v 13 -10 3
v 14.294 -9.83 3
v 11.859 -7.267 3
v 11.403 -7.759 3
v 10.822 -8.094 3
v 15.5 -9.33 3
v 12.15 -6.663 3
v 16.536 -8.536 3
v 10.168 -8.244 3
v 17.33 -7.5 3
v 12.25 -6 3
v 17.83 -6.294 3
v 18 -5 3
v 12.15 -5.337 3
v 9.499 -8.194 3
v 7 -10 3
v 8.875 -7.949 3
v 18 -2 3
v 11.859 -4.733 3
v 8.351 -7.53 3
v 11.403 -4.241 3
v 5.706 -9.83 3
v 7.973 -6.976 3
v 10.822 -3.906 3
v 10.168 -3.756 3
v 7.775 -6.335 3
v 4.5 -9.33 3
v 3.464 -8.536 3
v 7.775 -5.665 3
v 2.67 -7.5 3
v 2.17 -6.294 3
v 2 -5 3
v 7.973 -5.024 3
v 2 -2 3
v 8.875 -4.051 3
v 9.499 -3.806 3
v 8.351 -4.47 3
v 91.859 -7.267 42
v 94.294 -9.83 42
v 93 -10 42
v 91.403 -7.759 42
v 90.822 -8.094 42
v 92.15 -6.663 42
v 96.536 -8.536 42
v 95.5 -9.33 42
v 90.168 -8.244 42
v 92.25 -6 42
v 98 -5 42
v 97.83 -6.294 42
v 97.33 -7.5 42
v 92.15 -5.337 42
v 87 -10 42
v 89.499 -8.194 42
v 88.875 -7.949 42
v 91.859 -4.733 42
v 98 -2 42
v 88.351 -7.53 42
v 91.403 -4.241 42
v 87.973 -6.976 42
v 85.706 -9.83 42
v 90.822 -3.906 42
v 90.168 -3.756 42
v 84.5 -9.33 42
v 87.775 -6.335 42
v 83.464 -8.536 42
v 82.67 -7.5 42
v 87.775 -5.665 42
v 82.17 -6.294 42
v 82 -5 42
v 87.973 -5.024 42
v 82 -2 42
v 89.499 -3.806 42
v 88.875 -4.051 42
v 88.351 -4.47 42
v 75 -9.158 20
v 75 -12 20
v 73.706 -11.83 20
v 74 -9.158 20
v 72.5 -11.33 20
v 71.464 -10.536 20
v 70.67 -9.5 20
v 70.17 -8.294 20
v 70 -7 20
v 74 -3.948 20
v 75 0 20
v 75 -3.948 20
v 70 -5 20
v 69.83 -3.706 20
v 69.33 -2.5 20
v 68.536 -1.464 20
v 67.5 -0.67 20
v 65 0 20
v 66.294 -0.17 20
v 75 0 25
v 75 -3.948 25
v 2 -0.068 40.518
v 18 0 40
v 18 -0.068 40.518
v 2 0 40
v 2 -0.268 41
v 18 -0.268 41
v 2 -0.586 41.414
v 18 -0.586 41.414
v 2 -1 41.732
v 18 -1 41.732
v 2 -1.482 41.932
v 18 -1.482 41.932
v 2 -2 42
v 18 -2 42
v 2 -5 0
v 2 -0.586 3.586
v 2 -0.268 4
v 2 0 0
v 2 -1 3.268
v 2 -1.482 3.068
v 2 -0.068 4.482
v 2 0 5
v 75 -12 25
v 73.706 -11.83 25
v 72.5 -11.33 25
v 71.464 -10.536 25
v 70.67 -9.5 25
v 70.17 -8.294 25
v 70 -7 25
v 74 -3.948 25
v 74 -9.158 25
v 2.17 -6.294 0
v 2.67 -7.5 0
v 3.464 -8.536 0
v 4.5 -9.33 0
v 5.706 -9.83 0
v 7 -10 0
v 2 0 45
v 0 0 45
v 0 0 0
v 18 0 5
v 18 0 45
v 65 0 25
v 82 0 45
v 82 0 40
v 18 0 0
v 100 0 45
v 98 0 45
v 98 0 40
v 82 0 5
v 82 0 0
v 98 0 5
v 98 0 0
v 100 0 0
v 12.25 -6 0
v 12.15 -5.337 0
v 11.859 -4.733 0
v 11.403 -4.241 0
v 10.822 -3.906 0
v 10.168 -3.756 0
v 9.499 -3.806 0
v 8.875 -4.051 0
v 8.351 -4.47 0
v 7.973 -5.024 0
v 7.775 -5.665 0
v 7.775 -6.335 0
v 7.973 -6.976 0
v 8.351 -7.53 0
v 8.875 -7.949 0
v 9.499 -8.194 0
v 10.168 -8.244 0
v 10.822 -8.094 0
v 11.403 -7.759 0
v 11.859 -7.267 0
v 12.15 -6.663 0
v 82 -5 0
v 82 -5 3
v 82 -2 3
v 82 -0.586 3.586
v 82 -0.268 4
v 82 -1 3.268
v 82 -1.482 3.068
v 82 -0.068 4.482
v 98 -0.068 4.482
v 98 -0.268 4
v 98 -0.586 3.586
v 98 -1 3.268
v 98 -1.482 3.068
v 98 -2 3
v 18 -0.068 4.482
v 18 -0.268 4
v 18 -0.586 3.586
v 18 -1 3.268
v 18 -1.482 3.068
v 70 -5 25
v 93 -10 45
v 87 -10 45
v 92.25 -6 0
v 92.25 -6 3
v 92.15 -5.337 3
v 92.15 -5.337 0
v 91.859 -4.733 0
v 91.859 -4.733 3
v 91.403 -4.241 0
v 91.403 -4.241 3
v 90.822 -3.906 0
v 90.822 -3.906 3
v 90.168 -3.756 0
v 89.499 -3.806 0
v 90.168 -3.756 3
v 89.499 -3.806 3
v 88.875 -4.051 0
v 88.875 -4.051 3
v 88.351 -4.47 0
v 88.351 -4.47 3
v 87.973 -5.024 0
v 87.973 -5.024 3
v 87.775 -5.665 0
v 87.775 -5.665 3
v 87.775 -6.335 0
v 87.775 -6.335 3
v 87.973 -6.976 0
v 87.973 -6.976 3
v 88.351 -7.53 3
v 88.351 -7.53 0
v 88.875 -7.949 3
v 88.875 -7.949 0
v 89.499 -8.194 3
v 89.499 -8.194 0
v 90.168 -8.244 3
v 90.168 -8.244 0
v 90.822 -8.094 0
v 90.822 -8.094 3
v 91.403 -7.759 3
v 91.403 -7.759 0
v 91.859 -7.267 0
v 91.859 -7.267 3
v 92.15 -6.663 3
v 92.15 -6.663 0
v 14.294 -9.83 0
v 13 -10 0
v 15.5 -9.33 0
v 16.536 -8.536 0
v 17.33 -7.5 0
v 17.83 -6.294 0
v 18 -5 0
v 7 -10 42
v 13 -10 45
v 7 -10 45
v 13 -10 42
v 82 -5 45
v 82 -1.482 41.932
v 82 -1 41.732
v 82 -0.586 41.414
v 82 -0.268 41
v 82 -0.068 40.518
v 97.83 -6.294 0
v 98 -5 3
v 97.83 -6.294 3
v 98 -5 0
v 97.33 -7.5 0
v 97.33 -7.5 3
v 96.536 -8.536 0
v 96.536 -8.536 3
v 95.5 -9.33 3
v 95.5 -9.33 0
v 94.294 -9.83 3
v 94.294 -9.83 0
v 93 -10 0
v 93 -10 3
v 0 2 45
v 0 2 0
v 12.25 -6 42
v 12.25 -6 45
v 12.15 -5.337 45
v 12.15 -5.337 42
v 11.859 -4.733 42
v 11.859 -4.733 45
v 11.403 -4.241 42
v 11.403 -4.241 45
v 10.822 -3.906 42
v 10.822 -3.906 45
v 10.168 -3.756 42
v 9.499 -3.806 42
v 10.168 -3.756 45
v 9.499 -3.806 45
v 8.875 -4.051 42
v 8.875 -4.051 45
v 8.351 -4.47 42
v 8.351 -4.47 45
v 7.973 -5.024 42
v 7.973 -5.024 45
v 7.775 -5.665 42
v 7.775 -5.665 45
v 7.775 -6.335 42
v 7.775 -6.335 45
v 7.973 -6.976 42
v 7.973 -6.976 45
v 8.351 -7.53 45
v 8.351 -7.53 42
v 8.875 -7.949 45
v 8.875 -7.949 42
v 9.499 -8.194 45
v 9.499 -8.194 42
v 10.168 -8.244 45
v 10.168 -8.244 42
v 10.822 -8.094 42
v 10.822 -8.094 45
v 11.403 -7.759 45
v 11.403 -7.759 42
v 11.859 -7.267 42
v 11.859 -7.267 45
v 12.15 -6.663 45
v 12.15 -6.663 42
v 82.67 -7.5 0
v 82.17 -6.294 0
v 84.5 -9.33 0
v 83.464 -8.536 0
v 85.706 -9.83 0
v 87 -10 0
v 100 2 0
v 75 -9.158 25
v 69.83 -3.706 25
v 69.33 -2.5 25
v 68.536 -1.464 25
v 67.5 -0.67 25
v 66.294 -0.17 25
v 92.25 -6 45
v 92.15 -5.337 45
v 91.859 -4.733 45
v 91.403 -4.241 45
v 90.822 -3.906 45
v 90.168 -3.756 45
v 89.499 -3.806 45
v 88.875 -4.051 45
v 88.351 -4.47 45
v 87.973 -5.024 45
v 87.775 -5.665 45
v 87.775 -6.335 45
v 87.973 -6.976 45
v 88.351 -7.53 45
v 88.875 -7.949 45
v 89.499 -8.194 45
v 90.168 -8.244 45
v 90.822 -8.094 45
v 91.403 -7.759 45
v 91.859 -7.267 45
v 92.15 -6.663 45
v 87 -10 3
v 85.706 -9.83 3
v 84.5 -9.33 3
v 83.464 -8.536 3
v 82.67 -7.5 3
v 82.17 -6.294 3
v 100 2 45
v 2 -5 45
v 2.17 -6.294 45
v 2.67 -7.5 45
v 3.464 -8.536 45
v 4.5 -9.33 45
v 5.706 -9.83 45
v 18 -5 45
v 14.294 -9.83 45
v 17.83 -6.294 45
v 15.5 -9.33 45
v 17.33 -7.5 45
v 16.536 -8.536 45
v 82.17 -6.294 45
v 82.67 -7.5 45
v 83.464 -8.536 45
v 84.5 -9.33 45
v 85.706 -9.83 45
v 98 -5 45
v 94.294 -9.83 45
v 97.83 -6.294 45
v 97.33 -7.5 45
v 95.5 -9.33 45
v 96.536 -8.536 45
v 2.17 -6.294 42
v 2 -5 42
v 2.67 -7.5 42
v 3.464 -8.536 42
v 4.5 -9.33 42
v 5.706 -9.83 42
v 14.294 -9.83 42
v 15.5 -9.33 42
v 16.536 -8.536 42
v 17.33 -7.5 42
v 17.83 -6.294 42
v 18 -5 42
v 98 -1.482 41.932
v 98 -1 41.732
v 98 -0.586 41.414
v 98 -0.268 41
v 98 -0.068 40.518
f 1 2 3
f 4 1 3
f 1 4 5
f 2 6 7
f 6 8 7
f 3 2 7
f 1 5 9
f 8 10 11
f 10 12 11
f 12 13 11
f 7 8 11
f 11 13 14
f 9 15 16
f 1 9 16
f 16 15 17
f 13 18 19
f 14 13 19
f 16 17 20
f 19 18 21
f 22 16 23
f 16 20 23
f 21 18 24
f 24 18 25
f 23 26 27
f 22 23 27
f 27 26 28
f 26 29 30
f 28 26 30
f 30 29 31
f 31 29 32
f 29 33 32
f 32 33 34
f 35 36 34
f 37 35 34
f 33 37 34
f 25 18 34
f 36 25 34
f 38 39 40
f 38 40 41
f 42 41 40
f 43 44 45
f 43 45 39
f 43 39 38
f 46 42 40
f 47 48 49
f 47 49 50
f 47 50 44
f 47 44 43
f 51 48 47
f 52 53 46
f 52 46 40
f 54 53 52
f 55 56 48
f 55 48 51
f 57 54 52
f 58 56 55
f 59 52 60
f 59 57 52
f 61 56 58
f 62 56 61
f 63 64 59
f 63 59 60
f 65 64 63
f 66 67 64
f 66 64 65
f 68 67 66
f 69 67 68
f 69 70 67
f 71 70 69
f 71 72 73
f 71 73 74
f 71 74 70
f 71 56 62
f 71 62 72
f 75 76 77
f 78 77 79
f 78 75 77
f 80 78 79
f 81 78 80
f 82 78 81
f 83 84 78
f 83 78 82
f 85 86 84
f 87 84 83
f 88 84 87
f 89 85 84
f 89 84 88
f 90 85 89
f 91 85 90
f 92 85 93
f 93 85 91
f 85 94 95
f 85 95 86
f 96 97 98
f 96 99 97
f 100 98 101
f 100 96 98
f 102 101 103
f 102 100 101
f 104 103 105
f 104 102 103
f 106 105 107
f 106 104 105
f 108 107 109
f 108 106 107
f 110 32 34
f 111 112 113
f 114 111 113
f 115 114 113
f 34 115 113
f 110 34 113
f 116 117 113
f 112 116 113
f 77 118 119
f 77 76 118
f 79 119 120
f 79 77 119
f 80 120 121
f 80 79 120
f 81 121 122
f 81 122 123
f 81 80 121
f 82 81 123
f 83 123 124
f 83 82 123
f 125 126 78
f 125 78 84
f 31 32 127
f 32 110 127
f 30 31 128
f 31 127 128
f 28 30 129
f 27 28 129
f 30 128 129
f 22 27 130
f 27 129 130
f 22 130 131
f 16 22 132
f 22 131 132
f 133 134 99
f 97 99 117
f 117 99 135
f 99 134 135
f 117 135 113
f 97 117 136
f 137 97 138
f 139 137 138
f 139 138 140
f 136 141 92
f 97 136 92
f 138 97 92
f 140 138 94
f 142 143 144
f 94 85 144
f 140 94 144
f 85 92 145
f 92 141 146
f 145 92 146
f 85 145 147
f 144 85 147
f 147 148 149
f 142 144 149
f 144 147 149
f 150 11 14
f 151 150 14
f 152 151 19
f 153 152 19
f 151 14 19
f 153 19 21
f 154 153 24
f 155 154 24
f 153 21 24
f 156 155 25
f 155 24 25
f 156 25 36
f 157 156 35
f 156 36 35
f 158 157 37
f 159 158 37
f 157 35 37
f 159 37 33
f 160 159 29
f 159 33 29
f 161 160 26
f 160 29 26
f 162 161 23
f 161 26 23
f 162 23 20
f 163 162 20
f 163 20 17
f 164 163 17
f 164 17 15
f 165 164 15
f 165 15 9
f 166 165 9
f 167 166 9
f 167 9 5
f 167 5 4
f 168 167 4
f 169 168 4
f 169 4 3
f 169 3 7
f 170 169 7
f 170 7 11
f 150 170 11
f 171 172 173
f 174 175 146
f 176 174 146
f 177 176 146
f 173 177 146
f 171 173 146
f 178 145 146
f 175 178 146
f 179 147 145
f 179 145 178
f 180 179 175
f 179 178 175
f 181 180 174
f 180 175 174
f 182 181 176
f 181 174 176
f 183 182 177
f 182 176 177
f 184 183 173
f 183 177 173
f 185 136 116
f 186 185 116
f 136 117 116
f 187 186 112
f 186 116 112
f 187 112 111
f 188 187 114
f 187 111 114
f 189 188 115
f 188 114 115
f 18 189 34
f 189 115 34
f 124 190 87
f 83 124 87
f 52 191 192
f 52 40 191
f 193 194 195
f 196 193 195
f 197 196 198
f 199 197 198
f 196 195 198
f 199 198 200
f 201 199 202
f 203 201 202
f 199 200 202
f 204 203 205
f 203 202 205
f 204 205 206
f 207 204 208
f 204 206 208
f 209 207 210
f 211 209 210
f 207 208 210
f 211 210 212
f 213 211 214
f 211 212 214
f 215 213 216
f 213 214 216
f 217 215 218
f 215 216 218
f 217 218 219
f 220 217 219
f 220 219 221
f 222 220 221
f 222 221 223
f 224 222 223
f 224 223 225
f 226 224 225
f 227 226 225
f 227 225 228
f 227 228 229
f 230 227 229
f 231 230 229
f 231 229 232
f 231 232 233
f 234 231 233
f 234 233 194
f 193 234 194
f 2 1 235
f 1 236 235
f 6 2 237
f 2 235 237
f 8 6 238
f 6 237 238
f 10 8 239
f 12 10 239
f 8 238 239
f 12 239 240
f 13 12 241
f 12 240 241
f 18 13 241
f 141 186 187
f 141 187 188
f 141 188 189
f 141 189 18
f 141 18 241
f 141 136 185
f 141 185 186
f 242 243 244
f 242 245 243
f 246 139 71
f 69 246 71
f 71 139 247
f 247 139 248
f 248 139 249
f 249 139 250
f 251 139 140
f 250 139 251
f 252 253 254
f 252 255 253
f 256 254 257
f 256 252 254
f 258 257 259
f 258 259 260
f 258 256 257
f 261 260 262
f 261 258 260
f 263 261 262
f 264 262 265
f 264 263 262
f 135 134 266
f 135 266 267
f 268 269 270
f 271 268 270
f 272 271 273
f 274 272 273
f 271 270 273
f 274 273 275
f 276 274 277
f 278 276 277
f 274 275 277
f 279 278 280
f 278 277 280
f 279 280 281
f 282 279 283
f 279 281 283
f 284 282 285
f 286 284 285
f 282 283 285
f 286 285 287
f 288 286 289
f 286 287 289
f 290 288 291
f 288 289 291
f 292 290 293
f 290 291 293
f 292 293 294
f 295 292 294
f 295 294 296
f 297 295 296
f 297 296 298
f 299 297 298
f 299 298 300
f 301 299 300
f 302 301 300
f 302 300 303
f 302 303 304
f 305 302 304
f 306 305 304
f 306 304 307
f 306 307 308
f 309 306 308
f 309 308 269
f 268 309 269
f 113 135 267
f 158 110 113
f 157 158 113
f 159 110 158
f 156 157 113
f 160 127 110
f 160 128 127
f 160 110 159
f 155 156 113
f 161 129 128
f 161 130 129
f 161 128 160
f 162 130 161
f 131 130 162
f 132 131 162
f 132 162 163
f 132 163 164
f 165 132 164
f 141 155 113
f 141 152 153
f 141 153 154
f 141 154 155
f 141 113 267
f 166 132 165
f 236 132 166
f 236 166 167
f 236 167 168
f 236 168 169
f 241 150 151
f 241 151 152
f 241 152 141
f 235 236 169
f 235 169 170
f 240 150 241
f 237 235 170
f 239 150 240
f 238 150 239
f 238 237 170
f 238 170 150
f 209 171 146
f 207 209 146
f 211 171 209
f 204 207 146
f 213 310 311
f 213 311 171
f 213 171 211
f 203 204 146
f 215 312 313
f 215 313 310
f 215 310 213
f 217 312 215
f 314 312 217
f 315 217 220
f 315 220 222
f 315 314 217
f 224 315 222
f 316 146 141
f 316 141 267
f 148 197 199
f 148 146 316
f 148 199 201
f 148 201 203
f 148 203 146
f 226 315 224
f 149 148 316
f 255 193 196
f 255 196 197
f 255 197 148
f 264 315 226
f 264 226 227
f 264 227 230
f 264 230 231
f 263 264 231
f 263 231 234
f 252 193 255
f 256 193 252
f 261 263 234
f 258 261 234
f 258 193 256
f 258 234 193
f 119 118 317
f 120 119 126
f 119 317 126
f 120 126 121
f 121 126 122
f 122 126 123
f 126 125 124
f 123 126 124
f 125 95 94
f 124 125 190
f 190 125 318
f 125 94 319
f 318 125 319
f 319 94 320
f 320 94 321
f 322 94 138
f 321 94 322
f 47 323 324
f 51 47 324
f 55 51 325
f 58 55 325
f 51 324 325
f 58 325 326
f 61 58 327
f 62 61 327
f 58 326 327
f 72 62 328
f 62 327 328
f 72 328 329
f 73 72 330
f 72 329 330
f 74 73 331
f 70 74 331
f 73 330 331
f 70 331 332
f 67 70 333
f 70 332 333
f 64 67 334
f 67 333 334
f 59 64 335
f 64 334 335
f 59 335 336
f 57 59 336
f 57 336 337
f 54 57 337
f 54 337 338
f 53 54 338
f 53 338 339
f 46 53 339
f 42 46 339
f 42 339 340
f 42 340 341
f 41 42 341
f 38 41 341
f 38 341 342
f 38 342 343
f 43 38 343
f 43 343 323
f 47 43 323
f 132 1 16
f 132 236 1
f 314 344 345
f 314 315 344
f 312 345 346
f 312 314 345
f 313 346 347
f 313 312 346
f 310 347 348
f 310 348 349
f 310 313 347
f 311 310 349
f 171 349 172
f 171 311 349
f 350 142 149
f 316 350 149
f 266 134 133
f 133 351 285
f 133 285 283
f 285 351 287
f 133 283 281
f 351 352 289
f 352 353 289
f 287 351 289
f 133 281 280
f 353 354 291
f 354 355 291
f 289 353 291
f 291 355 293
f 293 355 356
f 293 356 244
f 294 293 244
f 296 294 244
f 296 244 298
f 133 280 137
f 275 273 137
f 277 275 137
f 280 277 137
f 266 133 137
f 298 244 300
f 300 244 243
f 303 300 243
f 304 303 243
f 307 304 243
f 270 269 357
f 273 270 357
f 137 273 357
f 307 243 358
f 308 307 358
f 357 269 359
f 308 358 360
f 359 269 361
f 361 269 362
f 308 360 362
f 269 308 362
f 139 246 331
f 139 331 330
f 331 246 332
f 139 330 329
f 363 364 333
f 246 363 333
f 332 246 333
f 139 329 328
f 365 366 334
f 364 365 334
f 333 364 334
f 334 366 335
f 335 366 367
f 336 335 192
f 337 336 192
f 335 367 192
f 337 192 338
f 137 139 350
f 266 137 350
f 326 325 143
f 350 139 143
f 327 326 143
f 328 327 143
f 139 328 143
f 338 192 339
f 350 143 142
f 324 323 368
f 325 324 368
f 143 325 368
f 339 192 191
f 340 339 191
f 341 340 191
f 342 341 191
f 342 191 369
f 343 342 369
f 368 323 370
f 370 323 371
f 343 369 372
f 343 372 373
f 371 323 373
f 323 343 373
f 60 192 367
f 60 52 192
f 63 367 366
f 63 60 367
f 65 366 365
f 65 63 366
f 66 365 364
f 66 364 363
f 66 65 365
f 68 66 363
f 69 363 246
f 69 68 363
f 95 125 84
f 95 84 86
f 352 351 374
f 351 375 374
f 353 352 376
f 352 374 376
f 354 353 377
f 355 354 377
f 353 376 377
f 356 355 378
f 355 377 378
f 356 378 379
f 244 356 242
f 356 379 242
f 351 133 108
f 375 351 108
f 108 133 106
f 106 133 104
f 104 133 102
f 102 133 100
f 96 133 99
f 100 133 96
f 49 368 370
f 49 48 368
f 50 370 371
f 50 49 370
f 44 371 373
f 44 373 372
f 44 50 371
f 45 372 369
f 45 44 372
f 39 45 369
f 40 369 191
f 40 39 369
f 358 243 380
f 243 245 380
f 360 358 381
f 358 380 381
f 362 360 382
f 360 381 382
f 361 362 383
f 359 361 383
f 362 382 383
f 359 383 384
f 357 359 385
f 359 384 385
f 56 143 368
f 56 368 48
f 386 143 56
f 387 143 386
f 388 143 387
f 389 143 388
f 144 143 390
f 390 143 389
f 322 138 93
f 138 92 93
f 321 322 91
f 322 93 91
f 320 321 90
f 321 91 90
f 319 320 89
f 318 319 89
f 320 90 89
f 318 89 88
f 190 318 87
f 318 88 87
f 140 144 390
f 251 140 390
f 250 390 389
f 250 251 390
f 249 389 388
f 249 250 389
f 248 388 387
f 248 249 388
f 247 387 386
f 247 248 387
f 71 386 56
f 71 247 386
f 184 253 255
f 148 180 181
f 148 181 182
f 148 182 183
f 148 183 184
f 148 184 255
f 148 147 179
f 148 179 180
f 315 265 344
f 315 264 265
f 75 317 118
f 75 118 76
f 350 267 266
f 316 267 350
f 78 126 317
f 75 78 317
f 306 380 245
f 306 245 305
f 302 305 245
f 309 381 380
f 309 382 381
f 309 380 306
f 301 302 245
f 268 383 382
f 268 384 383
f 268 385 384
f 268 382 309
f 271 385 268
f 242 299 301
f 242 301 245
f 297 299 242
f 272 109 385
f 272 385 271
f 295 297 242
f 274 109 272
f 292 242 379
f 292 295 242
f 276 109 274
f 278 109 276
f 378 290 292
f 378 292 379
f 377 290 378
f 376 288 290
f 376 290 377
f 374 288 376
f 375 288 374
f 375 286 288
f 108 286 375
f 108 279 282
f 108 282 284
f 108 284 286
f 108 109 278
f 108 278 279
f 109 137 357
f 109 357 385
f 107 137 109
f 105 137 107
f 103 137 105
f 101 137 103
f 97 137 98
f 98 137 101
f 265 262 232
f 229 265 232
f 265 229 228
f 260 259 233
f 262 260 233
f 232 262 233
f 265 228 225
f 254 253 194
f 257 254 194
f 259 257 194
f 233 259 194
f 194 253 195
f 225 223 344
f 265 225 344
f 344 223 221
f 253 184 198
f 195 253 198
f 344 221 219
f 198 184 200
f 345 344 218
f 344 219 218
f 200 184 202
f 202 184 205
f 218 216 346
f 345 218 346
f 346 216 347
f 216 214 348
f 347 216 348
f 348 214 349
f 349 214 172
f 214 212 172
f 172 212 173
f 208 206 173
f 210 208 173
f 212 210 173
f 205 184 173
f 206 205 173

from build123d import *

# Parameters (mm, degrees)
SKETCH_1_W          = 100
SKETCH_1_H          = 45
EXTRUDE_1_DEPTH     = 2
SKETCH_2_W          = 16
SKETCH_2_H          = 3
EXTRUDE_2_DEPTH     = 10
SKETCH_3_R          = 2.25
CUT_EXTRUDE_1_DEPTH = 111.113577728
SKETCH_4_W          = 5
SKETCH_4_H          = 5
EXTRUDE_3_DEPTH     = 12
FILLET_1_R          = 5
FILLET_2_R          = 5
FILLET_3_R          = 2
SKETCH_5_W          = 1
SKETCH_5_H          = 5.209702161
CUT_EXTRUDE1_DEPTH  = 10


with BuildPart() as part:
    # 草图1 → 凸台-拉伸1 (new body)
    with BuildSketch(Plane(origin=(0, 0, 0), x_dir=(1, 0, 0), z_dir=(0, 1, 0))):
        with Locations((50, -22.5)):
            Rectangle(SKETCH_1_W, SKETCH_1_H)
    extrude(amount=EXTRUDE_1_DEPTH)

    # 草图2 → 凸台-拉伸2 (add)
    with BuildSketch(Plane(origin=(0, 0, 0), x_dir=(-1, 0, 0), z_dir=(0, -1, 0))):
        with Locations((-10, -43.5)):
            Rectangle(SKETCH_2_W, SKETCH_2_H)
        with Locations((-10, -1.5)):
            Rectangle(SKETCH_2_W, SKETCH_2_H)
        with Locations((-90, -43.5)):
            Rectangle(SKETCH_2_W, SKETCH_2_H)
        with Locations((-90, -1.5)):
            Rectangle(SKETCH_2_W, SKETCH_2_H)
    extrude(amount=EXTRUDE_2_DEPTH)

    # 草图3 → 切除-拉伸1 (cut, through all)
    with BuildSketch(Plane.XY.offset(45)):
        with Locations((90, -6)):
            Circle(SKETCH_3_R)
        with Locations((10, -6)):
            Circle(SKETCH_3_R)
    extrude(amount=-CUT_EXTRUDE_1_DEPTH, mode=Mode.SUBTRACT)

    # 草图4 → 凸台-拉伸3 (add)
    with BuildSketch(Plane(origin=(0, 0, 0), x_dir=(-1, 0, 0), z_dir=(0, -1, 0))):
        with Locations((-72.5, -22.5)):
            Rectangle(SKETCH_4_W, SKETCH_4_H)
    extrude(amount=EXTRUDE_3_DEPTH)

    # 圆角1
    fillet_1_edges = [part.edges().sort_by_distance(p)[0] for p in [
        (2, -10, 43.5),
        (18, -10, 43.5),
        (2, -10, 1.5),
        (18, -10, 1.5),
        (82, -10, 43.5),
        (98, -10, 43.5),
        (82, -10, 1.5),
        (98, -10, 1.5),
    ]]
    fillet(fillet_1_edges, radius=FILLET_1_R)

    # 圆角2
    fillet_2_edges = [part.edges().sort_by_distance(p)[0] for p in [
        (70, 0, 22.5),
    ]]
    fillet(fillet_2_edges, radius=FILLET_2_R)
    fillet_2_2_edges = [part.edges().sort_by_distance(p)[0] for p in [
        (70, -12, 22.5),
    ]]
    fillet(fillet_2_2_edges, radius=FILLET_2_R - 0.0001)  # a hair under: the kernel refuses the full size

    # 圆角3
    fillet_3_edges = [part.edges().sort_by_distance(p)[0] for p in [
        (10, 0, 42),
        (10, 0, 3),
        (90, 0, 42),
        (90, 0, 3),
    ]]
    fillet(fillet_3_edges, radius=FILLET_3_R)

    # 草图5 → Cut-Extrude1 (cut)
    with BuildSketch(Plane.XY.offset(25)):
        with Locations((74.5, -6.55317269)):
            Rectangle(SKETCH_5_W, SKETCH_5_H)
    extrude(amount=-CUT_EXTRUDE1_DEPTH, mode=Mode.SUBTRACT)


solid = part.part
